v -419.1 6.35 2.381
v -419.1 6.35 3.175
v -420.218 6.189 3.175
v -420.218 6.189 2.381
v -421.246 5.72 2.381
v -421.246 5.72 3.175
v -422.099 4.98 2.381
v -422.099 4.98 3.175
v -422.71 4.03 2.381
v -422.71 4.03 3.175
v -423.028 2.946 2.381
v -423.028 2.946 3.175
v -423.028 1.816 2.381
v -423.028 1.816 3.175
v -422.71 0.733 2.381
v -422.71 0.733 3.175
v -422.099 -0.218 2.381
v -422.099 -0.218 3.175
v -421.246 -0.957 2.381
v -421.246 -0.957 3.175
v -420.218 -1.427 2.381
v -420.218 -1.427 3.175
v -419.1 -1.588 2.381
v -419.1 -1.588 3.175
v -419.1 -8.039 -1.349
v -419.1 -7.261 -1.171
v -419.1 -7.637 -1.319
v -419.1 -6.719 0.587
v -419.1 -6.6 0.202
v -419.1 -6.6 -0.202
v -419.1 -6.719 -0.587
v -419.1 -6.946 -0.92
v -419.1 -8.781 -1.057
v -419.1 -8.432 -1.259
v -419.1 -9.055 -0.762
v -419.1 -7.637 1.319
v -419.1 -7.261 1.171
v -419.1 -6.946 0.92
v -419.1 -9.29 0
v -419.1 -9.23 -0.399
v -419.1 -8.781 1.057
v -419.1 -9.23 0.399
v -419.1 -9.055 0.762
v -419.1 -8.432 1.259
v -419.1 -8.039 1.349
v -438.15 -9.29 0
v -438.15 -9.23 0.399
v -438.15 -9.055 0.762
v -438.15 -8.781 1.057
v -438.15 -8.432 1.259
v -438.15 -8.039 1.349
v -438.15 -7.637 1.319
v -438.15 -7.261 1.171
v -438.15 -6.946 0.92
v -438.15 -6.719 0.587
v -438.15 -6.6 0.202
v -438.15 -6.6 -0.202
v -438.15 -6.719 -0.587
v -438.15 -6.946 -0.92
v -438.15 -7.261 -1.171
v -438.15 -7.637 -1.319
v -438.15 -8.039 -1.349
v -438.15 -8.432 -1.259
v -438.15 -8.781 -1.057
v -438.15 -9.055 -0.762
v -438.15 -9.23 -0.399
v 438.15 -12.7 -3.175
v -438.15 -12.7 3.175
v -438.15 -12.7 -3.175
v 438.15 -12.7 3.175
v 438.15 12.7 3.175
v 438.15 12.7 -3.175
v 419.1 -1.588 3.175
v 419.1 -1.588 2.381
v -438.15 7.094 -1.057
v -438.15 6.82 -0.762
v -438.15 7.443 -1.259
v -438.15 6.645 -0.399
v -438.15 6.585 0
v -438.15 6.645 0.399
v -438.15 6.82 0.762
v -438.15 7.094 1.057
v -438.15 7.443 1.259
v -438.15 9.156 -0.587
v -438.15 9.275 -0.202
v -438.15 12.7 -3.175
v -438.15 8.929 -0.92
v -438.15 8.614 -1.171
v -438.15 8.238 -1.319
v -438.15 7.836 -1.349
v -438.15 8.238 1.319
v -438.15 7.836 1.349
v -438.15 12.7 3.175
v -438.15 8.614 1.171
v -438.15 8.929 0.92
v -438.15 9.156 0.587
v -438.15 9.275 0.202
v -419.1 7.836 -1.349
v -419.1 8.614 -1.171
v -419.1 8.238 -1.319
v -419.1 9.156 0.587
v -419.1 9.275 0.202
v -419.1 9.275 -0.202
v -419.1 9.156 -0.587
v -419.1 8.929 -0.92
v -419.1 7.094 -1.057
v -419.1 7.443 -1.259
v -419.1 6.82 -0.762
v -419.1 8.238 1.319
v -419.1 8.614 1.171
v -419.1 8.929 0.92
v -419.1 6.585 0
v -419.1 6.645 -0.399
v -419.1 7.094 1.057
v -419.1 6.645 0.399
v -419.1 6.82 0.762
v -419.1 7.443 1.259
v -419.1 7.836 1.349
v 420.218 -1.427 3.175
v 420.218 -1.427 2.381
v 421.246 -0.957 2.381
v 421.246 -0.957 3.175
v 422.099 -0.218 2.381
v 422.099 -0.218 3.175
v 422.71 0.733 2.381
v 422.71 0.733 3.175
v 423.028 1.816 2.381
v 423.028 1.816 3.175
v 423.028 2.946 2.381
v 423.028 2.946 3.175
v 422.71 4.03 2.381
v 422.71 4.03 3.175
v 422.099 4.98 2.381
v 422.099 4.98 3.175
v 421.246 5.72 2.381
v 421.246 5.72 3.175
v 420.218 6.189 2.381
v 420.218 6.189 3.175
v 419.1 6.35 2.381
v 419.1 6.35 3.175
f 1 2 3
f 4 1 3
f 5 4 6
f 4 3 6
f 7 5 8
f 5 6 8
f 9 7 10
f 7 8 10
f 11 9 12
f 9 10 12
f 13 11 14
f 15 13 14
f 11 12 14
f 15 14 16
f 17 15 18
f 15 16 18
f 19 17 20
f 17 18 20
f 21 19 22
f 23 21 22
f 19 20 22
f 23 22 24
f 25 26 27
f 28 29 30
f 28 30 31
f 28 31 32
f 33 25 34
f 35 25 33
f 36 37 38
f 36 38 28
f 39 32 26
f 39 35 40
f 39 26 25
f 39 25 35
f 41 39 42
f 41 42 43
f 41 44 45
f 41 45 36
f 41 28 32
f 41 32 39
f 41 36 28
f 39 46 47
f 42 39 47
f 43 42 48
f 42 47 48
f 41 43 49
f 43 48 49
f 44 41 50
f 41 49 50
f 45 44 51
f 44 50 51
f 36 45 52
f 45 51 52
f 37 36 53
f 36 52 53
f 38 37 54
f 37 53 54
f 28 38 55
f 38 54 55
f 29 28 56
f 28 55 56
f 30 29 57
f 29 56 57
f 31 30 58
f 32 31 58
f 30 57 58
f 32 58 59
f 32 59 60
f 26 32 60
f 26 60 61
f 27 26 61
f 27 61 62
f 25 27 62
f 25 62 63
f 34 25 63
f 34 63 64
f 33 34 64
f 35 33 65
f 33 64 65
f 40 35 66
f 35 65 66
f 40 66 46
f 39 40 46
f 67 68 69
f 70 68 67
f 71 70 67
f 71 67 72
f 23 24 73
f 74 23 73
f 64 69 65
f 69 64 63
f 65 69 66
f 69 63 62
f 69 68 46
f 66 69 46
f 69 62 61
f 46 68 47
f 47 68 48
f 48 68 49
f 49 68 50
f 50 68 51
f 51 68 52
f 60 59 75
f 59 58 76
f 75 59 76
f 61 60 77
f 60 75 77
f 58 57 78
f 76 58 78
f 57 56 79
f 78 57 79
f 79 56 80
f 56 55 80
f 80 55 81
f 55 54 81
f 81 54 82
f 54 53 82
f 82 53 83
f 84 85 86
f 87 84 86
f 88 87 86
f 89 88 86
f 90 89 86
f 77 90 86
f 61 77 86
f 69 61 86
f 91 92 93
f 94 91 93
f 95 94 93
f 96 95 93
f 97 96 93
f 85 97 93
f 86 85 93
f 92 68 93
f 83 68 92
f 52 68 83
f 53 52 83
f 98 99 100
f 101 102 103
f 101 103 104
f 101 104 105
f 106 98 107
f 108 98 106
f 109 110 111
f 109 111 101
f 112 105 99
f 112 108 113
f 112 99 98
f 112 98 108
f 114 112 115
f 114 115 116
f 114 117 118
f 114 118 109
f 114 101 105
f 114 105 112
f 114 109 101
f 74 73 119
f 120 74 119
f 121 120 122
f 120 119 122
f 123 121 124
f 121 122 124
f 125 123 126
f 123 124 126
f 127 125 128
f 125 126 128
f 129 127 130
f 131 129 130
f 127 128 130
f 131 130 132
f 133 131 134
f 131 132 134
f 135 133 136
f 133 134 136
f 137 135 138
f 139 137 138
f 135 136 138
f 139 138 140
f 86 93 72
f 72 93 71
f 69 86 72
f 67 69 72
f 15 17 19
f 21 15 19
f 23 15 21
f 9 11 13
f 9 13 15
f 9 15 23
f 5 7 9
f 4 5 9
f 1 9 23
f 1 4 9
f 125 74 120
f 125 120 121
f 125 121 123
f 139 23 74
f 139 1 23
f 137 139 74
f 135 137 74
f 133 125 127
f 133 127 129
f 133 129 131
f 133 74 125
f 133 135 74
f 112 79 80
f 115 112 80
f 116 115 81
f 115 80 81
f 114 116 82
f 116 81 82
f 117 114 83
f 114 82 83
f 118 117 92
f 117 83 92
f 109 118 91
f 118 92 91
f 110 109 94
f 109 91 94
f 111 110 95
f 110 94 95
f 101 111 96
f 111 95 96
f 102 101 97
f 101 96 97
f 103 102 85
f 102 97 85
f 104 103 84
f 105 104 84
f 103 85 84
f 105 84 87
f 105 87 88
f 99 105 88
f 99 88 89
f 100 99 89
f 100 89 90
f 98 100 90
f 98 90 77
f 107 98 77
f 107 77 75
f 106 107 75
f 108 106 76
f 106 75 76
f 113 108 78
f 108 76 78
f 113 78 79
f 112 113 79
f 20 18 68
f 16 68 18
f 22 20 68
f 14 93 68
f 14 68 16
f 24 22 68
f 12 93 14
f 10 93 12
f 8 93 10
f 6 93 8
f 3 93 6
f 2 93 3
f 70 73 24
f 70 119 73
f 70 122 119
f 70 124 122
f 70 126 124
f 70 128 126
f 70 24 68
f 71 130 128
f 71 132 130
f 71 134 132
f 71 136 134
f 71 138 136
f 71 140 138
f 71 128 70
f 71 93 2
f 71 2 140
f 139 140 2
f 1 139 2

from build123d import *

# Parameters (mm, degrees)
F0_W     = 876.3
F0_H     = 25.4
F1_DEPTH = 3.175
F2_R     = 1.35255
F3_DEPTH = 19.05
F5_DEPTH = 0.79375


with BuildPart() as f1:
    # F0 (on Top) → F1 (new body, symmetric)
    with BuildSketch(Plane.XY):
        Rectangle(F0_W, F0_H)
    extrude(amount=F1_DEPTH, both=True)

    # F2 (on face) → F3 (cut)
    with BuildSketch(Plane(origin=(-438.15, 0, 0), x_dir=(0, -1, 0), z_dir=(-1, 0, 0))):
        with Locations((-7.9375, 0)):
            Circle(F2_R)
        with Locations((7.9375, 0)):
            Circle(F2_R)
    extrude(amount=-F3_DEPTH, mode=Mode.SUBTRACT)

    # F4 (on face) → F5 (cut)
    with BuildSketch(Plane.XY.offset(3.175)):
        with BuildLine():
            Line((-419.1, -1.5875), (419.1, -1.5875))
            ThreePointArc((419.1, -1.5875), (423.06875, 2.38125), (419.1, 6.35))
            Line((419.1, 6.35), (-419.1, 6.35))
            ThreePointArc((-419.1, 6.35), (-423.06875, 2.38125), (-419.1, -1.5875))
        make_face()
    extrude(amount=-F5_DEPTH, mode=Mode.SUBTRACT)


solid = f1.part
